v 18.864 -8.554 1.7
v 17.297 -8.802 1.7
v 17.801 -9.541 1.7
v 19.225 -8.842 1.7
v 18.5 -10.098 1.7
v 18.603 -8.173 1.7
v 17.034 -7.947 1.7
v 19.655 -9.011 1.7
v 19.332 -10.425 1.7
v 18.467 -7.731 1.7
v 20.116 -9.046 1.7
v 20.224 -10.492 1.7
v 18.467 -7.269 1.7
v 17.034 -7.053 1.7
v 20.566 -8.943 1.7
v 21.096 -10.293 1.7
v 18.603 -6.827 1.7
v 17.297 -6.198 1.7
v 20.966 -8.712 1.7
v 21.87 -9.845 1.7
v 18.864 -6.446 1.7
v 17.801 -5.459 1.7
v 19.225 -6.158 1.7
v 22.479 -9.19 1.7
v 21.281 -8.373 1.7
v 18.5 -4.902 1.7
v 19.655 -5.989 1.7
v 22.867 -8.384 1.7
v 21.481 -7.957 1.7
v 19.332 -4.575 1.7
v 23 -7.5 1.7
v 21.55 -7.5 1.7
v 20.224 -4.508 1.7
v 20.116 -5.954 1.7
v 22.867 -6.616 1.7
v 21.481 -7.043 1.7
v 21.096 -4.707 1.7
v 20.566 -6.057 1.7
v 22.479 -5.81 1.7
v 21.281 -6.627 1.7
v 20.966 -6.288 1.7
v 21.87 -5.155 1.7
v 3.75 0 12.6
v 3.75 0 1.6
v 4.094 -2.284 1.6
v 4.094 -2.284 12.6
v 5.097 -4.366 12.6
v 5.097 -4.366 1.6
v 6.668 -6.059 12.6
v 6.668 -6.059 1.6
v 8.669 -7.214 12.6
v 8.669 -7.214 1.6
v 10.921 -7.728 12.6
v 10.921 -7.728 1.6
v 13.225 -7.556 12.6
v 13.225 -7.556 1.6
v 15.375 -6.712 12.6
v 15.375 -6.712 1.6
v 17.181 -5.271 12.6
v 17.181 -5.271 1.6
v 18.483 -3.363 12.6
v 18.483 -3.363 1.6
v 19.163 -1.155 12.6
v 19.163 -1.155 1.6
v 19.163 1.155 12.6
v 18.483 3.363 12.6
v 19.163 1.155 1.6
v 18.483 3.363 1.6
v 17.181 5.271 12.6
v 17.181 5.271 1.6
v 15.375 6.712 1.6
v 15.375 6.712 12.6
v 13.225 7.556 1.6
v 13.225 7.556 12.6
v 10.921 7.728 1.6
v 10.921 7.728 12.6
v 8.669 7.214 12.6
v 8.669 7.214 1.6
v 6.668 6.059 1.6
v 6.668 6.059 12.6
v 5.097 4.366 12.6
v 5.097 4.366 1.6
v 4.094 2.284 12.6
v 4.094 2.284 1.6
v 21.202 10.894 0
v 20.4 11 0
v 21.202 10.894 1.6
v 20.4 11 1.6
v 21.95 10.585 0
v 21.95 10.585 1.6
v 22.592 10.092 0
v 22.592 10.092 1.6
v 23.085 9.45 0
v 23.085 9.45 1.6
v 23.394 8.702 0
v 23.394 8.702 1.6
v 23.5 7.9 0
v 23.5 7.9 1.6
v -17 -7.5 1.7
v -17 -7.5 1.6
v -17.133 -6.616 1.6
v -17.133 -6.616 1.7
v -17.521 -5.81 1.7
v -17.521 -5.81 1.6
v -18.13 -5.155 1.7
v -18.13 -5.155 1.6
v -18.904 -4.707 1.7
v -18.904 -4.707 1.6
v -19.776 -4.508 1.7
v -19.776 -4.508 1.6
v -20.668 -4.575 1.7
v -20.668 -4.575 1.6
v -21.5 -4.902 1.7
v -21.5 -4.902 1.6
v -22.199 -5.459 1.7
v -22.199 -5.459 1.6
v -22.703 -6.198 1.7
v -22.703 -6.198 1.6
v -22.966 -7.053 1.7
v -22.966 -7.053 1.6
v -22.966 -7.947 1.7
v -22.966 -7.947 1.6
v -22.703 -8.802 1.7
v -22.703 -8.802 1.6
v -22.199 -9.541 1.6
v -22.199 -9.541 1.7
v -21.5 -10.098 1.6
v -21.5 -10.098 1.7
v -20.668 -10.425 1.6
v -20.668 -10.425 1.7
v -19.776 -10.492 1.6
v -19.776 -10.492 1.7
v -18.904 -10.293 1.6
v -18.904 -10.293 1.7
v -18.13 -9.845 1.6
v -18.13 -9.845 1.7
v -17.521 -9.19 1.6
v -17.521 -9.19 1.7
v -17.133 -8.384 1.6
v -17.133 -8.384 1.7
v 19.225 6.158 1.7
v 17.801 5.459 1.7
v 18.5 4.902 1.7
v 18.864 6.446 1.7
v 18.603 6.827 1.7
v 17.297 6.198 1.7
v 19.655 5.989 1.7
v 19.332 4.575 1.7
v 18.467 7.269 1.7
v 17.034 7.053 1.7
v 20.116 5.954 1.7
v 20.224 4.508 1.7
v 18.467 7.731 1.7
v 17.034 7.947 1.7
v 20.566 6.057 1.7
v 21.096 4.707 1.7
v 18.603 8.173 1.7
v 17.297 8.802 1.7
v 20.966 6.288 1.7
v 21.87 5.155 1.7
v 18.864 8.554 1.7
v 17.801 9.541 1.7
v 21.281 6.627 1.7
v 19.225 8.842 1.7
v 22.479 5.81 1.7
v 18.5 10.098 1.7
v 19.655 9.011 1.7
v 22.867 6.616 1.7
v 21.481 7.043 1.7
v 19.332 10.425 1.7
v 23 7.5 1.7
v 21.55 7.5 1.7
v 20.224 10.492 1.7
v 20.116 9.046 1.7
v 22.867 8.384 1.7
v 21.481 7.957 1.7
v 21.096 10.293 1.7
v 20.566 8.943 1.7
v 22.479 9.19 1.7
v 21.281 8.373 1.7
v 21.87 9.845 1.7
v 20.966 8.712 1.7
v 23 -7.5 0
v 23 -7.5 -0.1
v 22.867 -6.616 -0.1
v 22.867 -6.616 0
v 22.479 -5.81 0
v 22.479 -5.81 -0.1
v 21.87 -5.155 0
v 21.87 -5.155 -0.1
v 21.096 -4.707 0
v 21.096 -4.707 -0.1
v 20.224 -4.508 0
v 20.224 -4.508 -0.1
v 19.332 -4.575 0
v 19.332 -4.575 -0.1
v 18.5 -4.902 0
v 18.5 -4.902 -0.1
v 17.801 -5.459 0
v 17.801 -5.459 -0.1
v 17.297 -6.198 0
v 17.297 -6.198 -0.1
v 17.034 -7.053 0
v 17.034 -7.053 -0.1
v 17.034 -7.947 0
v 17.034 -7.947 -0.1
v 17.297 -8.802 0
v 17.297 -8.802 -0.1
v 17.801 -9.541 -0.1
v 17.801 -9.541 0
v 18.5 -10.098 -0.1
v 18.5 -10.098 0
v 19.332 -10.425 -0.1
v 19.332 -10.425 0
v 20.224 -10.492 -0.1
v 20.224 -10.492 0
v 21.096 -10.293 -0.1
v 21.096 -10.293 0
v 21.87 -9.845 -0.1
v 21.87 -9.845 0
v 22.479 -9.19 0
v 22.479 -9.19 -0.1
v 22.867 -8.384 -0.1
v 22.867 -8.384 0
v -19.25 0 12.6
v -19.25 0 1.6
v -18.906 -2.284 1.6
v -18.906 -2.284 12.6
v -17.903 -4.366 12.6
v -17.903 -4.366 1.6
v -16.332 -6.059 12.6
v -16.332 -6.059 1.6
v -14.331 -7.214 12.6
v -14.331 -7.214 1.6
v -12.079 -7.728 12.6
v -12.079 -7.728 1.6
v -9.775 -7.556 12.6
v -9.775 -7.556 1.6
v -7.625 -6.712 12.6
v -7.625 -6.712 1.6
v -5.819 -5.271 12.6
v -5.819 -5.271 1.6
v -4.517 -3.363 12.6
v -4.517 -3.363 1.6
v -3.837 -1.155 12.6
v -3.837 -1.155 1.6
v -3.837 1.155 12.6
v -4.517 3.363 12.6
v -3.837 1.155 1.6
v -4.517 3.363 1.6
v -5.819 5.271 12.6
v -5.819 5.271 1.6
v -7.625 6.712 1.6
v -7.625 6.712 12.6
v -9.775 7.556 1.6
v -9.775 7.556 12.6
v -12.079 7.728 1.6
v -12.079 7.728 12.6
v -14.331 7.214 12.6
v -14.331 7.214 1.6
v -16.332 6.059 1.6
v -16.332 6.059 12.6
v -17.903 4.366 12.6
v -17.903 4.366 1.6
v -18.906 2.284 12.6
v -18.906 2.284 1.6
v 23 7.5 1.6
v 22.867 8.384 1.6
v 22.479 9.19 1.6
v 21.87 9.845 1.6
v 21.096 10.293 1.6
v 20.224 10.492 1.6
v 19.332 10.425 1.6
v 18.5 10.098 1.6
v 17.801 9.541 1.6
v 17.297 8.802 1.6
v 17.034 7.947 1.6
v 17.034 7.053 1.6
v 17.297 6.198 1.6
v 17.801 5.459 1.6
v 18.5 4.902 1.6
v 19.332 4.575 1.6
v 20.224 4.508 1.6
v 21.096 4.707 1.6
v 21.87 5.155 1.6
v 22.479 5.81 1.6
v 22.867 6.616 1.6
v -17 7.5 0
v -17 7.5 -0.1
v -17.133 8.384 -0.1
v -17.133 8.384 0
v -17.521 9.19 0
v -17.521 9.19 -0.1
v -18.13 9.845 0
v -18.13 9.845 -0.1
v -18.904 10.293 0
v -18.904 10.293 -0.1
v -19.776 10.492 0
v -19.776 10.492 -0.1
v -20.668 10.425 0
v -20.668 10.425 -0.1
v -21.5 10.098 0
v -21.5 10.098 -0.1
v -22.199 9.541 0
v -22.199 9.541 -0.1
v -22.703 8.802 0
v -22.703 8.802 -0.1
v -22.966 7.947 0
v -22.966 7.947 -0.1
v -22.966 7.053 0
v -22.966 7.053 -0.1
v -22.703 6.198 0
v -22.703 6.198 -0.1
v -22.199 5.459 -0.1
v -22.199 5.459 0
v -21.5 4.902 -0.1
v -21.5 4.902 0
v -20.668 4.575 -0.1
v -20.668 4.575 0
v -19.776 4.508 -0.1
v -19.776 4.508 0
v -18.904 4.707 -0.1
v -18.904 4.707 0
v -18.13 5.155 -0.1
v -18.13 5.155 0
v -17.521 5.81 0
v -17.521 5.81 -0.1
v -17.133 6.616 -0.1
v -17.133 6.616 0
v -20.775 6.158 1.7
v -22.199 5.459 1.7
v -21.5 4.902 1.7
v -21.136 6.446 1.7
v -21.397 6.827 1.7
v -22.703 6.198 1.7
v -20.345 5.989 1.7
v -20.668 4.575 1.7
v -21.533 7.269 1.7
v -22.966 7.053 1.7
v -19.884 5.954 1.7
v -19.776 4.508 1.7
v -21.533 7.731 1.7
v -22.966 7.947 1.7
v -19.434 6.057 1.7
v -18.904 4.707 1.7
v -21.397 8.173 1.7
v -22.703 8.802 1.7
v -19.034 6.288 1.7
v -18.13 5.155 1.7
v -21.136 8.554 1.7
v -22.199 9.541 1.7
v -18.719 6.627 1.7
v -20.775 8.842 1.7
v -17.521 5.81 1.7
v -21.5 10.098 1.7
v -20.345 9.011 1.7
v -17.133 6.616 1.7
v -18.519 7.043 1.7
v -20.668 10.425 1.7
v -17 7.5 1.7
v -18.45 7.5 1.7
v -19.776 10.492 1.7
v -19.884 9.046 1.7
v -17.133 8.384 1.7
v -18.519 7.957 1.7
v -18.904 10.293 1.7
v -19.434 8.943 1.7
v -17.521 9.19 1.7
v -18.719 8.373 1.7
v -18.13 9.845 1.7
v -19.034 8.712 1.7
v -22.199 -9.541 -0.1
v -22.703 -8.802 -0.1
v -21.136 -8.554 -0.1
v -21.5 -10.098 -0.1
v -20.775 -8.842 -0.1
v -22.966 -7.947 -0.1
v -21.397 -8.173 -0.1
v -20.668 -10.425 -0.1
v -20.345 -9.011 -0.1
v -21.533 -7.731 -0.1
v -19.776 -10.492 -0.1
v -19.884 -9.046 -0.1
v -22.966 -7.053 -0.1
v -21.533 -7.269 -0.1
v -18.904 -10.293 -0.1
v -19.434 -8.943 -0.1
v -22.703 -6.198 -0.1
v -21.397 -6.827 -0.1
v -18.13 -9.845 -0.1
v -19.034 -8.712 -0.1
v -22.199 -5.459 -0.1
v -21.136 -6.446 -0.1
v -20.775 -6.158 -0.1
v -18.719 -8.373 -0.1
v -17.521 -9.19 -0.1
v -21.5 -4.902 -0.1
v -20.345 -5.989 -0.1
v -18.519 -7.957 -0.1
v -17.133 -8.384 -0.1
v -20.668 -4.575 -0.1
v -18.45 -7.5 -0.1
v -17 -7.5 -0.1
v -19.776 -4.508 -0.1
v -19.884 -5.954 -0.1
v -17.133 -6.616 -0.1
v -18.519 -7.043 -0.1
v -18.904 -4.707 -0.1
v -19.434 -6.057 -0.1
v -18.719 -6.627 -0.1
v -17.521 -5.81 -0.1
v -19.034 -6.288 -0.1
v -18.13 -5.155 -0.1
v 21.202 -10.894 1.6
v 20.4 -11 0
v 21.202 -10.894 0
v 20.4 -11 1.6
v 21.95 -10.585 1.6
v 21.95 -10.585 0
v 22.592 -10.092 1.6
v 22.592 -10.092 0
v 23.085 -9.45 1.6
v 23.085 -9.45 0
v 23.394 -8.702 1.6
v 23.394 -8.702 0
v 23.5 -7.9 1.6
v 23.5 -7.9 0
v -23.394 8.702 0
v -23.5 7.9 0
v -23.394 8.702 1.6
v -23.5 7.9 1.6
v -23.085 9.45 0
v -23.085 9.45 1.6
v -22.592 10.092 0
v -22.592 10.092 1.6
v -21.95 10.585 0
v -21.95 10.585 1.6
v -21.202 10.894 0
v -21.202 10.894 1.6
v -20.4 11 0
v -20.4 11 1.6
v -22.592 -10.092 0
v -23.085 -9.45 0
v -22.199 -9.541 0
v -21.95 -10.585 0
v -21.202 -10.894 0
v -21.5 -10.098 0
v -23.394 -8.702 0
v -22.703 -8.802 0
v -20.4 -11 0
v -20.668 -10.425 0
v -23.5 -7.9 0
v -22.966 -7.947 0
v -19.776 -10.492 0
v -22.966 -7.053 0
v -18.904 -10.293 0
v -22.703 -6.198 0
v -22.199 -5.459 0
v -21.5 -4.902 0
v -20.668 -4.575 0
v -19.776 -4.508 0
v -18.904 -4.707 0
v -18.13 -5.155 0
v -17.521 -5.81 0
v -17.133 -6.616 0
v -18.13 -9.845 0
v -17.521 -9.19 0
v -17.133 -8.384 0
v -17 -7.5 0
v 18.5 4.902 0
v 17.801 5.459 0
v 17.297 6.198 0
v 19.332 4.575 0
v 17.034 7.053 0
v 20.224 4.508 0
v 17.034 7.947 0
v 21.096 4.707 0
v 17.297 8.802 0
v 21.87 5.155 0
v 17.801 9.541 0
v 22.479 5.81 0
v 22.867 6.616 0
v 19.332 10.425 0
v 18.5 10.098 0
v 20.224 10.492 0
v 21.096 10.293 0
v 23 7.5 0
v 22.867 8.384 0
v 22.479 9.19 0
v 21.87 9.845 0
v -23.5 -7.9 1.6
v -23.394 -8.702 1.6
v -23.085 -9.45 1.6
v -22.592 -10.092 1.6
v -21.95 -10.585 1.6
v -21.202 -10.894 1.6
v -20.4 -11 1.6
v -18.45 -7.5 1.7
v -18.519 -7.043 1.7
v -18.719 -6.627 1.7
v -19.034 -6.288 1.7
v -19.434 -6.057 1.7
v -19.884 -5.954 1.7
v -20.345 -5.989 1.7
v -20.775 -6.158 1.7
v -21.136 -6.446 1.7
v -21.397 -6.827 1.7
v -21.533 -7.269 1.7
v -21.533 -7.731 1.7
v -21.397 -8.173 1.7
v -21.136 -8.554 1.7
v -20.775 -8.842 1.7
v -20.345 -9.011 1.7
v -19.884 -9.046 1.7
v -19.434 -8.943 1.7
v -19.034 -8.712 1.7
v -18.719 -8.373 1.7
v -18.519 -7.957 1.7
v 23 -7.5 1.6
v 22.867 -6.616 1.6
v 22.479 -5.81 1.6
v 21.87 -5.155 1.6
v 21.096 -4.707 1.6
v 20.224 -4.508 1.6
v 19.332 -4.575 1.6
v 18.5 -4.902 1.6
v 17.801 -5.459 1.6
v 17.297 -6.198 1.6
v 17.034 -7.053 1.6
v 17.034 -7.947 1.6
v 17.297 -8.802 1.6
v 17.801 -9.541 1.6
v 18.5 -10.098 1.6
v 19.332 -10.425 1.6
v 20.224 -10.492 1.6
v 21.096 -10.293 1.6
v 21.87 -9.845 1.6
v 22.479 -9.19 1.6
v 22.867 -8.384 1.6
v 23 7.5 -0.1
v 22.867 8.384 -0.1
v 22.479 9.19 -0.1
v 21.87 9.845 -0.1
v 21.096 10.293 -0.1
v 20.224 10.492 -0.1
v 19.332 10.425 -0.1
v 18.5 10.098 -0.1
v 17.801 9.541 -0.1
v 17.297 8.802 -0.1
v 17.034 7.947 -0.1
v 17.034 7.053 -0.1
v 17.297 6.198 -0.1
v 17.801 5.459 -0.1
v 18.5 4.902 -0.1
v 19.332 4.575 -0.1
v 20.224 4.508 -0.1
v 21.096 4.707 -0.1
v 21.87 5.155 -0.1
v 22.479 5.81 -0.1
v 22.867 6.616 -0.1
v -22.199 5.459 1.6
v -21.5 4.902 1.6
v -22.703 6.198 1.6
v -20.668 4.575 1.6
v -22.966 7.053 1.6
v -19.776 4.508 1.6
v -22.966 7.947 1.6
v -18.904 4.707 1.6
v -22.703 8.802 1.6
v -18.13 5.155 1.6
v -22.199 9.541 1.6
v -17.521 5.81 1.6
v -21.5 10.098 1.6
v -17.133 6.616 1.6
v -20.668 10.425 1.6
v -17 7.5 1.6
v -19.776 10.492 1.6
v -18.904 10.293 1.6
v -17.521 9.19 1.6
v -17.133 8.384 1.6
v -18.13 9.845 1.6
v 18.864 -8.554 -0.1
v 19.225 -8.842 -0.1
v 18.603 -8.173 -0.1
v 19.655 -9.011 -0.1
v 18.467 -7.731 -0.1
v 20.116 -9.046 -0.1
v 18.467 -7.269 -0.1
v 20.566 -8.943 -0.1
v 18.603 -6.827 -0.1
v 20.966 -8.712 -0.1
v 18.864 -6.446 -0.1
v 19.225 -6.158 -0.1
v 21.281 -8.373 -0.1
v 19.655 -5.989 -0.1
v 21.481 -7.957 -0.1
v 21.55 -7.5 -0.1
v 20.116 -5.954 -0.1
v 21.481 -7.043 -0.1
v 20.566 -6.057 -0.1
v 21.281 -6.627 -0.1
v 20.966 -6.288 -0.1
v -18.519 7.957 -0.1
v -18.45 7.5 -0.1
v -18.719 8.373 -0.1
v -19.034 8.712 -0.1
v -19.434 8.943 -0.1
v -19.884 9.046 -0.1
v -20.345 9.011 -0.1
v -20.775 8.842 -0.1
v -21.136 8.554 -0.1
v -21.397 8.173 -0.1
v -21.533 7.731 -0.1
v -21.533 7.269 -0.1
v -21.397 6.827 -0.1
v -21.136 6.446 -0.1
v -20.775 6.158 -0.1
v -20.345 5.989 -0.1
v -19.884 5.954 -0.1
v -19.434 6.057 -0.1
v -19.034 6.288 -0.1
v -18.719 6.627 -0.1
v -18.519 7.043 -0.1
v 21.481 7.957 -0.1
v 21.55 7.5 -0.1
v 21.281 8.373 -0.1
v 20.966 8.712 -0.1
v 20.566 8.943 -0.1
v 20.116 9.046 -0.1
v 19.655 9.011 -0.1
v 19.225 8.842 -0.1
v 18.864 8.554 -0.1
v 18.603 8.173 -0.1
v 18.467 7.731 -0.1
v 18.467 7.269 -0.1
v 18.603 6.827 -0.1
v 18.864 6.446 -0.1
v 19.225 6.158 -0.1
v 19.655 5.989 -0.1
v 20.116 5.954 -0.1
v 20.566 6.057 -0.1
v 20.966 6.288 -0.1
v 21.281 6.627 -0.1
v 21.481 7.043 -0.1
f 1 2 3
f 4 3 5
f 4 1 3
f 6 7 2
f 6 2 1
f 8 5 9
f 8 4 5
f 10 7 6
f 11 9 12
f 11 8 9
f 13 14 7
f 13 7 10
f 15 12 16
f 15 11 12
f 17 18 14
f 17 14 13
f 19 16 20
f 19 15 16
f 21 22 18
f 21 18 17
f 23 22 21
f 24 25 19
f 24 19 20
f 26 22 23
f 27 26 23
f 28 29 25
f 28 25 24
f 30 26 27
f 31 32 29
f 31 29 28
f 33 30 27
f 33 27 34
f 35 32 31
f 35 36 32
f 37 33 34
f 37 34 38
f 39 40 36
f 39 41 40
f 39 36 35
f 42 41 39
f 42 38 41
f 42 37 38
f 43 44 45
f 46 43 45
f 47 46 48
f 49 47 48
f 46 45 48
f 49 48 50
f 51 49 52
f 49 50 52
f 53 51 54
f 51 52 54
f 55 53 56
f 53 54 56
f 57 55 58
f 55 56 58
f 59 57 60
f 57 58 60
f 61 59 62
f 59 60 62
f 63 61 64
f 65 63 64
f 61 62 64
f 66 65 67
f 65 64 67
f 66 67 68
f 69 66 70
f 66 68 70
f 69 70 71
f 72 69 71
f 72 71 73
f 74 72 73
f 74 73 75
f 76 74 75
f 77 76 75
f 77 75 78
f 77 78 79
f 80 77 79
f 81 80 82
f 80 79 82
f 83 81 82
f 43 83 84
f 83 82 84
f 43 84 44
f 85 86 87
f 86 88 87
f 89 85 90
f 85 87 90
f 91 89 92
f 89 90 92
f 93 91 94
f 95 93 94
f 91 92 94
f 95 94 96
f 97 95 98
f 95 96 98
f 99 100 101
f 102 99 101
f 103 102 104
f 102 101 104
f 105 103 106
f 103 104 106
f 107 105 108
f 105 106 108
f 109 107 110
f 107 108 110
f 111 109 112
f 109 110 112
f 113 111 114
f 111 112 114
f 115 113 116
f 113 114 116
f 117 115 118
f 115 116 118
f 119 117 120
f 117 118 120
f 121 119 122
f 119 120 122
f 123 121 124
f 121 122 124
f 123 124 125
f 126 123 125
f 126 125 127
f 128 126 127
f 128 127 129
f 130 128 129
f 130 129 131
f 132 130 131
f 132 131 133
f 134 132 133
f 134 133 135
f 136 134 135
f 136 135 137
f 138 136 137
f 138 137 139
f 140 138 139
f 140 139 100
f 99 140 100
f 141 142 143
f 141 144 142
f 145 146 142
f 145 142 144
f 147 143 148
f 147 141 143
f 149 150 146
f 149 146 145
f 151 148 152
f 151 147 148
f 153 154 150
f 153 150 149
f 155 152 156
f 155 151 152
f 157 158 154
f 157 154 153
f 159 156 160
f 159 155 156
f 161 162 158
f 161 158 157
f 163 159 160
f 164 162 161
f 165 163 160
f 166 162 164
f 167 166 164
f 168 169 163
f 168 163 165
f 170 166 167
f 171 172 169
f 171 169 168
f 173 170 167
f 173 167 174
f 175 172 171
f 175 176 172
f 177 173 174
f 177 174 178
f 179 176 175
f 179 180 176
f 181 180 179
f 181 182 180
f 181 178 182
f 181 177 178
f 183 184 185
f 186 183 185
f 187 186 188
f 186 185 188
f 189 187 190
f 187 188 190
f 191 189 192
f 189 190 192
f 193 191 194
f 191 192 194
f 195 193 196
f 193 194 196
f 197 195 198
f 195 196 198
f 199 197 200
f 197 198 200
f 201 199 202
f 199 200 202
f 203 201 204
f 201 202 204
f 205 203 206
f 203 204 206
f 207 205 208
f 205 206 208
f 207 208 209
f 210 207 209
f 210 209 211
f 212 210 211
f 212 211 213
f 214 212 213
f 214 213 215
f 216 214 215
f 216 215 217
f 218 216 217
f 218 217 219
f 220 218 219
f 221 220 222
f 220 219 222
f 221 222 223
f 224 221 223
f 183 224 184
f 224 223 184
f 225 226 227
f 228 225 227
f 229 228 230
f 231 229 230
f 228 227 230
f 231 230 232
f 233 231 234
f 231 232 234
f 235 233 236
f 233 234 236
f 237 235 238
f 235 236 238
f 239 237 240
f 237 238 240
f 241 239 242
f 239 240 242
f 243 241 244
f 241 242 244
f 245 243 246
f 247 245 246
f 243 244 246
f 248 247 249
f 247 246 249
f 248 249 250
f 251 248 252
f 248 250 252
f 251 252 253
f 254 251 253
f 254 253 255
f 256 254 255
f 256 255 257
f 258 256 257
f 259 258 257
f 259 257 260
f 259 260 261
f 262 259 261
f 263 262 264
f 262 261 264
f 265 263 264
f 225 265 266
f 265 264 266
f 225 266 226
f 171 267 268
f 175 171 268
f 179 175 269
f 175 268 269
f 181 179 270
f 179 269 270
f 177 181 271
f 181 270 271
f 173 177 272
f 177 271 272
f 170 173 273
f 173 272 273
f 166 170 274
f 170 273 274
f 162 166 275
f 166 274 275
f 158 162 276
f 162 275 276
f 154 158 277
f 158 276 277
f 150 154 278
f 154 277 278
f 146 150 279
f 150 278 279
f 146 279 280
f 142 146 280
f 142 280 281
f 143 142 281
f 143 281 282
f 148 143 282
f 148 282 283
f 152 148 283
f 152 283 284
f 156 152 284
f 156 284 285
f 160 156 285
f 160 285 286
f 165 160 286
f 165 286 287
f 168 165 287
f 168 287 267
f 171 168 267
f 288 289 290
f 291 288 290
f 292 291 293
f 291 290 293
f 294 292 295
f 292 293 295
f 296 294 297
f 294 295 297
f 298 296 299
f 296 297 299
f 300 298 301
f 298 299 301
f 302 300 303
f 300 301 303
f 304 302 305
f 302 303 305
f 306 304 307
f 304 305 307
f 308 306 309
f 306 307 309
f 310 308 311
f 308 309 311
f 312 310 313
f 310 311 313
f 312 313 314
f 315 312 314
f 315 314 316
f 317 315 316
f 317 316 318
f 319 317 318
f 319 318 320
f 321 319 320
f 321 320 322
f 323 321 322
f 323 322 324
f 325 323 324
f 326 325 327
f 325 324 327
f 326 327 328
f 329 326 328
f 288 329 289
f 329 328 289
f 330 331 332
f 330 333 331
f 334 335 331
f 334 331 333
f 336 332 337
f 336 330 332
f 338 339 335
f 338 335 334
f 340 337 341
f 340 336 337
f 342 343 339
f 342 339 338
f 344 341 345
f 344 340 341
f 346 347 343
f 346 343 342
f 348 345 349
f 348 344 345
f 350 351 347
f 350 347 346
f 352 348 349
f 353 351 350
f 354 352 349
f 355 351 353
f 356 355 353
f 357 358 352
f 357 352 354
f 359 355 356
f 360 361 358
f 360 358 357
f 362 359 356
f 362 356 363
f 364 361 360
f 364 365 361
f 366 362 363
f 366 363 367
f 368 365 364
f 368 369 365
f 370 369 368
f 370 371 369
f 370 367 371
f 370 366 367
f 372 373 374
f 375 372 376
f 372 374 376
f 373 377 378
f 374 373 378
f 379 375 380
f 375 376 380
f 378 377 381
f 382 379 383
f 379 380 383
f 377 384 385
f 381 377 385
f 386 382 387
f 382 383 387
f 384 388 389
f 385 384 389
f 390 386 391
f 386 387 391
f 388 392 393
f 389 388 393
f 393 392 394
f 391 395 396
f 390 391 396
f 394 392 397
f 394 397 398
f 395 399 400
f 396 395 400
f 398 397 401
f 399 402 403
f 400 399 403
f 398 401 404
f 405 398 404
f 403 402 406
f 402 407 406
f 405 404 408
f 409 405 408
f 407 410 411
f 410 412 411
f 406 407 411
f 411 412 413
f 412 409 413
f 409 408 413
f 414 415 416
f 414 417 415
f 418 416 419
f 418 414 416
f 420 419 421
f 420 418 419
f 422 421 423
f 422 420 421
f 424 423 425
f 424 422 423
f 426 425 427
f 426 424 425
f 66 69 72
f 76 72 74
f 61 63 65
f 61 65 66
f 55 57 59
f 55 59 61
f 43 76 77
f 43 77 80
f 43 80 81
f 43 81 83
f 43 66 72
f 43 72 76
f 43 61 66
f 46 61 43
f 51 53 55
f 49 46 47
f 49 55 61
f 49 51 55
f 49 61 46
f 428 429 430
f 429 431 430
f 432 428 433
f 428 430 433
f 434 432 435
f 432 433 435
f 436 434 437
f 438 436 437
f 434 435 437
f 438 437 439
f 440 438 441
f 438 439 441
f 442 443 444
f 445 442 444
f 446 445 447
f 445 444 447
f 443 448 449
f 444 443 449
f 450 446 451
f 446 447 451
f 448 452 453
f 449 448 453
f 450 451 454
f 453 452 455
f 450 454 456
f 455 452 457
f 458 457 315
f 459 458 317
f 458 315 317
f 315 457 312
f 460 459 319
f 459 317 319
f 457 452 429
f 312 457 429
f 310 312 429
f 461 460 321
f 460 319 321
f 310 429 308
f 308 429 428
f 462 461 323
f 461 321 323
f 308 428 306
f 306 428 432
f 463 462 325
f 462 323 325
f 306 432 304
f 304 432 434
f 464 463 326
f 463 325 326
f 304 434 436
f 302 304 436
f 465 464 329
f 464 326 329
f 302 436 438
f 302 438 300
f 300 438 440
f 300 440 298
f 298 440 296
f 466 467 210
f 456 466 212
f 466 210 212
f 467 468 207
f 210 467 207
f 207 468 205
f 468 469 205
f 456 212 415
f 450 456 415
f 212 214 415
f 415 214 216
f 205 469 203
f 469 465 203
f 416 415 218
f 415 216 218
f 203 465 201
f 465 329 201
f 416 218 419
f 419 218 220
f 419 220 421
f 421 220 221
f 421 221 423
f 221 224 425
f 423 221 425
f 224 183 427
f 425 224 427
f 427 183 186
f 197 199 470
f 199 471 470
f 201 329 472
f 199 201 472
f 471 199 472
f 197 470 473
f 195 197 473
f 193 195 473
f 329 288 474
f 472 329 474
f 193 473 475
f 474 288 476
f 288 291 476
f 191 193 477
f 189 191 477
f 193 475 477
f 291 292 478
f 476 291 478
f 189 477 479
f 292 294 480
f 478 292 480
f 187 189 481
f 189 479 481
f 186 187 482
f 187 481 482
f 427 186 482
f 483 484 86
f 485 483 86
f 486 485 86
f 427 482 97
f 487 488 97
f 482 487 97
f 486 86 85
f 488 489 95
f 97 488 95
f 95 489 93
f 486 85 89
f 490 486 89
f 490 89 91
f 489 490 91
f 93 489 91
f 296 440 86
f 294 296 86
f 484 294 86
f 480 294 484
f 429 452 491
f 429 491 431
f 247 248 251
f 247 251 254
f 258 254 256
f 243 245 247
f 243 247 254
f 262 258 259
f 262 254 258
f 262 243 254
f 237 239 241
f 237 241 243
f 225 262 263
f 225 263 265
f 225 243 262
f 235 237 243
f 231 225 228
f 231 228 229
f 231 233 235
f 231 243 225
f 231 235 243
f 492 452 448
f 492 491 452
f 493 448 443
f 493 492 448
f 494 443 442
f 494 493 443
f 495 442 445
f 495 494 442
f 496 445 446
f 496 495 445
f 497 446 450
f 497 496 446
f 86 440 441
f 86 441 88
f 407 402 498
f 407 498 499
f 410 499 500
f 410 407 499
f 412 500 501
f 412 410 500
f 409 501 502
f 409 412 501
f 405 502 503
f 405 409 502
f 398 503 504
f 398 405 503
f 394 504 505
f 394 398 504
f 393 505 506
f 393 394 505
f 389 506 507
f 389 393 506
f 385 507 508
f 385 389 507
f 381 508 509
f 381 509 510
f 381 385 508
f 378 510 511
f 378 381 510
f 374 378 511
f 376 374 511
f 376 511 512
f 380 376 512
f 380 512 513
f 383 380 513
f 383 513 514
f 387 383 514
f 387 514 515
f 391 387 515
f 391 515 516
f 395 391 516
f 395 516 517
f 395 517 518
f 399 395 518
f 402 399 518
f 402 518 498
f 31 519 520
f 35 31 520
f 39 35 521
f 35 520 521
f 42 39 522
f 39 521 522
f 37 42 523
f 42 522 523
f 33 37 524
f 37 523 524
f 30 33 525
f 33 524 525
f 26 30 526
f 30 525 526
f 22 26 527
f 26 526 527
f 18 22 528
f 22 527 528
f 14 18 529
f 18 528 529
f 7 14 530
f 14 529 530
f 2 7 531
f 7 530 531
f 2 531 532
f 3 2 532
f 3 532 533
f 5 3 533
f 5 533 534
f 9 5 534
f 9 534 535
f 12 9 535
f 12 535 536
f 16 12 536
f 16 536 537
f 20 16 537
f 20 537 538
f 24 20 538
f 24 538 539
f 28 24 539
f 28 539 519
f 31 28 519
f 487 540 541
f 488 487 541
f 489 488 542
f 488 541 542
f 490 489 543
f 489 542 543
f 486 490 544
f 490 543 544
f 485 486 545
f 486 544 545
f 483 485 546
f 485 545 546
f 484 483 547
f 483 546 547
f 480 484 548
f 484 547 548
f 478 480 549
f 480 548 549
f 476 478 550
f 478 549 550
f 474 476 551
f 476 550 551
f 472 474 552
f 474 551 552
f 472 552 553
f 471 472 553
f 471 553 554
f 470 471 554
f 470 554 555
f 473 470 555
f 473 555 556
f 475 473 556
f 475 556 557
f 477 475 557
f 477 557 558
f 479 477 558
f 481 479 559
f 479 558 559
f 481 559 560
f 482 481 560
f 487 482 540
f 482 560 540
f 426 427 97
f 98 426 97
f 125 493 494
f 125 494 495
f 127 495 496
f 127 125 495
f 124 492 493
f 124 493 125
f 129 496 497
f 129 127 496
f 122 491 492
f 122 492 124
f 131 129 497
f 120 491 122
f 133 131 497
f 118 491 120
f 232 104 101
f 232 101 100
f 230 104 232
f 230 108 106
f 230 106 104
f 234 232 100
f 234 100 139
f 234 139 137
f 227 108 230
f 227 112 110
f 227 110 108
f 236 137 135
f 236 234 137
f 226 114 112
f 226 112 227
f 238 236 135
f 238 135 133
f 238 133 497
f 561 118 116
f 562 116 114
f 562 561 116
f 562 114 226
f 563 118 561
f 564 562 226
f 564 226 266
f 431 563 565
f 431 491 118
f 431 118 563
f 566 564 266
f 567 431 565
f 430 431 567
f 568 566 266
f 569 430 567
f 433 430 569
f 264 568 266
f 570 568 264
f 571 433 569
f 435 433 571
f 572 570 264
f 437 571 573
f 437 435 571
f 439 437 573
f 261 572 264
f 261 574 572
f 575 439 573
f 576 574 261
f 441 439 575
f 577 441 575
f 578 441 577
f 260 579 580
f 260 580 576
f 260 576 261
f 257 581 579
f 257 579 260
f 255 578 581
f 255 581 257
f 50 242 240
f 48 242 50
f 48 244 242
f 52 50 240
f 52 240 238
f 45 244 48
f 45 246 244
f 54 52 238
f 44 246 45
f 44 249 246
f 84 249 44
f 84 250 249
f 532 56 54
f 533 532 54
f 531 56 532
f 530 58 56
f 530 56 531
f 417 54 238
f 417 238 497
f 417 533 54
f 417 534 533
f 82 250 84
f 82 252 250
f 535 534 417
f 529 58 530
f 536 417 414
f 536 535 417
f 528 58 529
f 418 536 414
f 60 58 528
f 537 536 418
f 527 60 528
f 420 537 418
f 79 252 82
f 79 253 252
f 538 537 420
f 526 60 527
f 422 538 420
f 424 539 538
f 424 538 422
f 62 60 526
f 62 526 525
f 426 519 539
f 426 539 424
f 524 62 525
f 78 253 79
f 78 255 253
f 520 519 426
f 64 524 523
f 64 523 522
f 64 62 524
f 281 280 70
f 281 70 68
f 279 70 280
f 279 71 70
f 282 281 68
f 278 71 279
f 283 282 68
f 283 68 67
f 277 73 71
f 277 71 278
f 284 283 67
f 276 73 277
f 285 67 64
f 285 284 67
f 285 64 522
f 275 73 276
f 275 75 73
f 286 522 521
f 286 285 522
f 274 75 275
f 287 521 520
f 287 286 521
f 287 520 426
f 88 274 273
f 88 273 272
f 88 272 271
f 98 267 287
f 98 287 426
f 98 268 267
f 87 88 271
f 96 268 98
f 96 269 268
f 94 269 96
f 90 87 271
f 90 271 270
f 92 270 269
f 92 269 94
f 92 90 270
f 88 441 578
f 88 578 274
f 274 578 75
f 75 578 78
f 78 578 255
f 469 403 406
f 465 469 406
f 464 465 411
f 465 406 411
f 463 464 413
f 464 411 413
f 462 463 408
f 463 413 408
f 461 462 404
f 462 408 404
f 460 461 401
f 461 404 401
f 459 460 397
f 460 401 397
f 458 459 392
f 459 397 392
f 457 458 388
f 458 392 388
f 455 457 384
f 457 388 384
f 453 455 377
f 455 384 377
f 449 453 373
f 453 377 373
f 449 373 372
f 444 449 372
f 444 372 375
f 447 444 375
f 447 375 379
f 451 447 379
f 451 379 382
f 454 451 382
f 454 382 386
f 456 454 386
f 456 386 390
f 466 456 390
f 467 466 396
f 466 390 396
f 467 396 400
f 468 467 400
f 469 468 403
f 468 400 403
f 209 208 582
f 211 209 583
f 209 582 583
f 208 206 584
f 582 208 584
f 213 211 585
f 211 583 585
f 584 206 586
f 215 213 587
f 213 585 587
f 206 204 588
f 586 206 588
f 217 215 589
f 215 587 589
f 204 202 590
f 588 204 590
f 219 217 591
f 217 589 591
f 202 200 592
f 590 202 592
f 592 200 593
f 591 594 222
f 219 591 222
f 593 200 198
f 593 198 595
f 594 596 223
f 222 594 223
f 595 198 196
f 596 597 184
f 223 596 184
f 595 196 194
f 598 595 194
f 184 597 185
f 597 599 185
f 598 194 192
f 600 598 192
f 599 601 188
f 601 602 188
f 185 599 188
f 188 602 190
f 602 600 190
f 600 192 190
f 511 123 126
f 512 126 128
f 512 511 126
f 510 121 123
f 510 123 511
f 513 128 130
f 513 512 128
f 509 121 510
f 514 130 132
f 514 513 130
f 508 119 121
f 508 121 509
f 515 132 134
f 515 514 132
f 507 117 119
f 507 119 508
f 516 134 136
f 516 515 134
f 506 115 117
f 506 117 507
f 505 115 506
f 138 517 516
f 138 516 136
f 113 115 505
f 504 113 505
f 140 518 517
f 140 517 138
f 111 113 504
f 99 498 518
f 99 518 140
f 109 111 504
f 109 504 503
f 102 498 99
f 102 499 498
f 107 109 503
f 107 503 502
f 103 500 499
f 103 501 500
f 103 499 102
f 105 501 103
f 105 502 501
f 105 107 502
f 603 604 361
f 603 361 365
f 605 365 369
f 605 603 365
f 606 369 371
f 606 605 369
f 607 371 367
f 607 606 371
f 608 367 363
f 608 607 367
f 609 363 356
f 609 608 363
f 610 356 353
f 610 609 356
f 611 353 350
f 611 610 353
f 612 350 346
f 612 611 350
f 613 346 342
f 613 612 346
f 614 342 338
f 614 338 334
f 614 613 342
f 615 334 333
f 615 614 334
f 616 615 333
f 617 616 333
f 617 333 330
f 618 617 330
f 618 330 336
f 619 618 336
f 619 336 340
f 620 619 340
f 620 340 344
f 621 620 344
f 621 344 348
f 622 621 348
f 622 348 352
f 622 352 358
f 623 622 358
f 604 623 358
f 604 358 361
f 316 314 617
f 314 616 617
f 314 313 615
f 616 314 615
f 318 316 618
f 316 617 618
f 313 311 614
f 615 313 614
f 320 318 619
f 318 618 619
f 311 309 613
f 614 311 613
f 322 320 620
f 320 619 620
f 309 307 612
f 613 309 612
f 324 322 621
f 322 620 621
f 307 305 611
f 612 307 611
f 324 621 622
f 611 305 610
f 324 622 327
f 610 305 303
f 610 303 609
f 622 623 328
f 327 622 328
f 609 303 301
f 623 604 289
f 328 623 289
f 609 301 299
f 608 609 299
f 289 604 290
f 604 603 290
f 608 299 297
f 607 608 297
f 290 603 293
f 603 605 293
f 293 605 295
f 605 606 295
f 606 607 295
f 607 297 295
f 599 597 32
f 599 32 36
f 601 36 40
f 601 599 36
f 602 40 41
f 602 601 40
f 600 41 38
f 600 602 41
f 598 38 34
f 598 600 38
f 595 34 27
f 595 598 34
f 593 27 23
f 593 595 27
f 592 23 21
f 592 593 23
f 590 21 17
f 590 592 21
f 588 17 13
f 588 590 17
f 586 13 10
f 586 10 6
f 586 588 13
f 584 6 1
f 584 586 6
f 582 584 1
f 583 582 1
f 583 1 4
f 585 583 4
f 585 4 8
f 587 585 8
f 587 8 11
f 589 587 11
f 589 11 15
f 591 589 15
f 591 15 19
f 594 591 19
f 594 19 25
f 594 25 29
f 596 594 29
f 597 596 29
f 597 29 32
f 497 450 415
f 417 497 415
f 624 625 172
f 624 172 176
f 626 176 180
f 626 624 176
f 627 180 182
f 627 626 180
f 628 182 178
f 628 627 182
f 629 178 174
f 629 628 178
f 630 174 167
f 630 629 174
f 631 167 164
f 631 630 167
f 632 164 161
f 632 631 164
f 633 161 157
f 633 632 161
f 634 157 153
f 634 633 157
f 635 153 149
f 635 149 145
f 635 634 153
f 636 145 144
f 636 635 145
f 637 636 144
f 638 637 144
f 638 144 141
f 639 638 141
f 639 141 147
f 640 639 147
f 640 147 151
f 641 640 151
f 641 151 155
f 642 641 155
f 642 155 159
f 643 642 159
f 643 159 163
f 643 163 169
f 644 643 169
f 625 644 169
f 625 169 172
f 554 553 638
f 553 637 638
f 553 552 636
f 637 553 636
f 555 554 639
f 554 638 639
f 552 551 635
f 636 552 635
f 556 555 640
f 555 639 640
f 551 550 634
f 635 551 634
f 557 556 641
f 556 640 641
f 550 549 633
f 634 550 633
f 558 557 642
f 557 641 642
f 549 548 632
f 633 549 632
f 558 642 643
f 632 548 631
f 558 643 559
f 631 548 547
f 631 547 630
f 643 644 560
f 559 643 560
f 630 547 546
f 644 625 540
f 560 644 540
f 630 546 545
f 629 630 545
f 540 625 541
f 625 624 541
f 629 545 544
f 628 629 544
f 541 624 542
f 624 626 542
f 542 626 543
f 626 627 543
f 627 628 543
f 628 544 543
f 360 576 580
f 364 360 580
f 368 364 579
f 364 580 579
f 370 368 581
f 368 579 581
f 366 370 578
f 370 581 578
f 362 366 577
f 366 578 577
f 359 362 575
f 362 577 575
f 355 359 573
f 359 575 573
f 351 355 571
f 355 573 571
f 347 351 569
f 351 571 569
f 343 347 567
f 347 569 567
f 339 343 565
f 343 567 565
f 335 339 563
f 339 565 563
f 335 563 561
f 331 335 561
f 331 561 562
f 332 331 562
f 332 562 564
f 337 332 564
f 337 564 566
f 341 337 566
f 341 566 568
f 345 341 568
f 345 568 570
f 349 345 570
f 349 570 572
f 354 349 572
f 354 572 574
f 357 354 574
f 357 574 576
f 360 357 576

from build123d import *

# Parameters (mm, degrees)
SKETCH1_W                = 47
SKETCH1_H                = 22
SKETCH1_R                = 1.55
BOSS_EXTRUDE1_DEPTH      = 1.6
FILLET1_R                = 3.1
BOSS_EXTRUDE4_DEPTH      = 0.1
BOSS_EXTRUDE4_DEPTH_BACK = 1.7
SKETCH2_R                = 3
SKETCH2_R_2              = 1.55
SKETCH3_R                = 7.75
BOSS_EXTRUDE8_DEPTH      = 11


with BuildPart() as part:
    # Sketch1 → Boss-Extrude1 (new body)
    with BuildSketch(Plane.XY):
        Rectangle(SKETCH1_W, SKETCH1_H)
        with Locations((-20, 7.5)):
            Circle(SKETCH1_R, mode=Mode.SUBTRACT)
        with Locations((20, 7.5)):
            Circle(SKETCH1_R, mode=Mode.SUBTRACT)
        with Locations((20, -7.5)):
            Circle(SKETCH1_R, mode=Mode.SUBTRACT)
        with Locations((-20, -7.5)):
            Circle(SKETCH1_R, mode=Mode.SUBTRACT)
    extrude(amount=BOSS_EXTRUDE1_DEPTH)

    # Fillet1
    fillet1_edges = [part.edges().sort_by_distance(p)[0] for p in [
        (23.5, -11, 0.8),
        (-23.5, -11, 0.8),
        (-23.5, 11, 0.8),
        (23.5, 11, 0.8),
    ]]
    fillet(fillet1_edges, radius=FILLET1_R)

    # Sketch2 → Boss-Extrude4 (add, two sides: drawn at the far end of the back side and taken through both)
    # profile 1 of 4: a face of its own
    with BuildSketch(Plane.XY.offset(1.6).offset(-BOSS_EXTRUDE4_DEPTH_BACK)):
        with Locations((-20, 7.5)):
            Circle(SKETCH2_R)
        with Locations((-20, 7.5)):
            Circle(SKETCH2_R_2, mode=Mode.SUBTRACT)
    # profile 2 of 4: a face of its own
    with BuildSketch(Plane.XY.offset(1.6).offset(-BOSS_EXTRUDE4_DEPTH_BACK)):
        with Locations((-20, -7.5)):
            Circle(SKETCH2_R)
        with Locations((-20, -7.5)):
            Circle(SKETCH2_R_2, mode=Mode.SUBTRACT)
    # profile 3 of 4: a face of its own
    with BuildSketch(Plane.XY.offset(1.6).offset(-BOSS_EXTRUDE4_DEPTH_BACK)):
        with Locations((20, 7.5)):
            Circle(SKETCH2_R)
        with Locations((20, 7.5)):
            Circle(SKETCH2_R_2, mode=Mode.SUBTRACT)
    # profile 4 of 4: a face of its own
    with BuildSketch(Plane.XY.offset(1.6).offset(-BOSS_EXTRUDE4_DEPTH_BACK)):
        with Locations((20, -7.5)):
            Circle(SKETCH2_R)
        with Locations((20, -7.5)):
            Circle(SKETCH2_R_2, mode=Mode.SUBTRACT)
    extrude(amount=BOSS_EXTRUDE4_DEPTH + BOSS_EXTRUDE4_DEPTH_BACK)

    # Sketch3 → Boss-Extrude8 (add)
    with BuildSketch(Plane.XY.offset(1.6)):
        with Locations(Location((11.5, 0, 0), (0, 0, 180))):
            Circle(SKETCH3_R)
        with Locations(Location((-11.5, 0, 0), (0, 0, 180))):
            Circle(SKETCH3_R)
    extrude(amount=BOSS_EXTRUDE8_DEPTH)


solid = part.part
